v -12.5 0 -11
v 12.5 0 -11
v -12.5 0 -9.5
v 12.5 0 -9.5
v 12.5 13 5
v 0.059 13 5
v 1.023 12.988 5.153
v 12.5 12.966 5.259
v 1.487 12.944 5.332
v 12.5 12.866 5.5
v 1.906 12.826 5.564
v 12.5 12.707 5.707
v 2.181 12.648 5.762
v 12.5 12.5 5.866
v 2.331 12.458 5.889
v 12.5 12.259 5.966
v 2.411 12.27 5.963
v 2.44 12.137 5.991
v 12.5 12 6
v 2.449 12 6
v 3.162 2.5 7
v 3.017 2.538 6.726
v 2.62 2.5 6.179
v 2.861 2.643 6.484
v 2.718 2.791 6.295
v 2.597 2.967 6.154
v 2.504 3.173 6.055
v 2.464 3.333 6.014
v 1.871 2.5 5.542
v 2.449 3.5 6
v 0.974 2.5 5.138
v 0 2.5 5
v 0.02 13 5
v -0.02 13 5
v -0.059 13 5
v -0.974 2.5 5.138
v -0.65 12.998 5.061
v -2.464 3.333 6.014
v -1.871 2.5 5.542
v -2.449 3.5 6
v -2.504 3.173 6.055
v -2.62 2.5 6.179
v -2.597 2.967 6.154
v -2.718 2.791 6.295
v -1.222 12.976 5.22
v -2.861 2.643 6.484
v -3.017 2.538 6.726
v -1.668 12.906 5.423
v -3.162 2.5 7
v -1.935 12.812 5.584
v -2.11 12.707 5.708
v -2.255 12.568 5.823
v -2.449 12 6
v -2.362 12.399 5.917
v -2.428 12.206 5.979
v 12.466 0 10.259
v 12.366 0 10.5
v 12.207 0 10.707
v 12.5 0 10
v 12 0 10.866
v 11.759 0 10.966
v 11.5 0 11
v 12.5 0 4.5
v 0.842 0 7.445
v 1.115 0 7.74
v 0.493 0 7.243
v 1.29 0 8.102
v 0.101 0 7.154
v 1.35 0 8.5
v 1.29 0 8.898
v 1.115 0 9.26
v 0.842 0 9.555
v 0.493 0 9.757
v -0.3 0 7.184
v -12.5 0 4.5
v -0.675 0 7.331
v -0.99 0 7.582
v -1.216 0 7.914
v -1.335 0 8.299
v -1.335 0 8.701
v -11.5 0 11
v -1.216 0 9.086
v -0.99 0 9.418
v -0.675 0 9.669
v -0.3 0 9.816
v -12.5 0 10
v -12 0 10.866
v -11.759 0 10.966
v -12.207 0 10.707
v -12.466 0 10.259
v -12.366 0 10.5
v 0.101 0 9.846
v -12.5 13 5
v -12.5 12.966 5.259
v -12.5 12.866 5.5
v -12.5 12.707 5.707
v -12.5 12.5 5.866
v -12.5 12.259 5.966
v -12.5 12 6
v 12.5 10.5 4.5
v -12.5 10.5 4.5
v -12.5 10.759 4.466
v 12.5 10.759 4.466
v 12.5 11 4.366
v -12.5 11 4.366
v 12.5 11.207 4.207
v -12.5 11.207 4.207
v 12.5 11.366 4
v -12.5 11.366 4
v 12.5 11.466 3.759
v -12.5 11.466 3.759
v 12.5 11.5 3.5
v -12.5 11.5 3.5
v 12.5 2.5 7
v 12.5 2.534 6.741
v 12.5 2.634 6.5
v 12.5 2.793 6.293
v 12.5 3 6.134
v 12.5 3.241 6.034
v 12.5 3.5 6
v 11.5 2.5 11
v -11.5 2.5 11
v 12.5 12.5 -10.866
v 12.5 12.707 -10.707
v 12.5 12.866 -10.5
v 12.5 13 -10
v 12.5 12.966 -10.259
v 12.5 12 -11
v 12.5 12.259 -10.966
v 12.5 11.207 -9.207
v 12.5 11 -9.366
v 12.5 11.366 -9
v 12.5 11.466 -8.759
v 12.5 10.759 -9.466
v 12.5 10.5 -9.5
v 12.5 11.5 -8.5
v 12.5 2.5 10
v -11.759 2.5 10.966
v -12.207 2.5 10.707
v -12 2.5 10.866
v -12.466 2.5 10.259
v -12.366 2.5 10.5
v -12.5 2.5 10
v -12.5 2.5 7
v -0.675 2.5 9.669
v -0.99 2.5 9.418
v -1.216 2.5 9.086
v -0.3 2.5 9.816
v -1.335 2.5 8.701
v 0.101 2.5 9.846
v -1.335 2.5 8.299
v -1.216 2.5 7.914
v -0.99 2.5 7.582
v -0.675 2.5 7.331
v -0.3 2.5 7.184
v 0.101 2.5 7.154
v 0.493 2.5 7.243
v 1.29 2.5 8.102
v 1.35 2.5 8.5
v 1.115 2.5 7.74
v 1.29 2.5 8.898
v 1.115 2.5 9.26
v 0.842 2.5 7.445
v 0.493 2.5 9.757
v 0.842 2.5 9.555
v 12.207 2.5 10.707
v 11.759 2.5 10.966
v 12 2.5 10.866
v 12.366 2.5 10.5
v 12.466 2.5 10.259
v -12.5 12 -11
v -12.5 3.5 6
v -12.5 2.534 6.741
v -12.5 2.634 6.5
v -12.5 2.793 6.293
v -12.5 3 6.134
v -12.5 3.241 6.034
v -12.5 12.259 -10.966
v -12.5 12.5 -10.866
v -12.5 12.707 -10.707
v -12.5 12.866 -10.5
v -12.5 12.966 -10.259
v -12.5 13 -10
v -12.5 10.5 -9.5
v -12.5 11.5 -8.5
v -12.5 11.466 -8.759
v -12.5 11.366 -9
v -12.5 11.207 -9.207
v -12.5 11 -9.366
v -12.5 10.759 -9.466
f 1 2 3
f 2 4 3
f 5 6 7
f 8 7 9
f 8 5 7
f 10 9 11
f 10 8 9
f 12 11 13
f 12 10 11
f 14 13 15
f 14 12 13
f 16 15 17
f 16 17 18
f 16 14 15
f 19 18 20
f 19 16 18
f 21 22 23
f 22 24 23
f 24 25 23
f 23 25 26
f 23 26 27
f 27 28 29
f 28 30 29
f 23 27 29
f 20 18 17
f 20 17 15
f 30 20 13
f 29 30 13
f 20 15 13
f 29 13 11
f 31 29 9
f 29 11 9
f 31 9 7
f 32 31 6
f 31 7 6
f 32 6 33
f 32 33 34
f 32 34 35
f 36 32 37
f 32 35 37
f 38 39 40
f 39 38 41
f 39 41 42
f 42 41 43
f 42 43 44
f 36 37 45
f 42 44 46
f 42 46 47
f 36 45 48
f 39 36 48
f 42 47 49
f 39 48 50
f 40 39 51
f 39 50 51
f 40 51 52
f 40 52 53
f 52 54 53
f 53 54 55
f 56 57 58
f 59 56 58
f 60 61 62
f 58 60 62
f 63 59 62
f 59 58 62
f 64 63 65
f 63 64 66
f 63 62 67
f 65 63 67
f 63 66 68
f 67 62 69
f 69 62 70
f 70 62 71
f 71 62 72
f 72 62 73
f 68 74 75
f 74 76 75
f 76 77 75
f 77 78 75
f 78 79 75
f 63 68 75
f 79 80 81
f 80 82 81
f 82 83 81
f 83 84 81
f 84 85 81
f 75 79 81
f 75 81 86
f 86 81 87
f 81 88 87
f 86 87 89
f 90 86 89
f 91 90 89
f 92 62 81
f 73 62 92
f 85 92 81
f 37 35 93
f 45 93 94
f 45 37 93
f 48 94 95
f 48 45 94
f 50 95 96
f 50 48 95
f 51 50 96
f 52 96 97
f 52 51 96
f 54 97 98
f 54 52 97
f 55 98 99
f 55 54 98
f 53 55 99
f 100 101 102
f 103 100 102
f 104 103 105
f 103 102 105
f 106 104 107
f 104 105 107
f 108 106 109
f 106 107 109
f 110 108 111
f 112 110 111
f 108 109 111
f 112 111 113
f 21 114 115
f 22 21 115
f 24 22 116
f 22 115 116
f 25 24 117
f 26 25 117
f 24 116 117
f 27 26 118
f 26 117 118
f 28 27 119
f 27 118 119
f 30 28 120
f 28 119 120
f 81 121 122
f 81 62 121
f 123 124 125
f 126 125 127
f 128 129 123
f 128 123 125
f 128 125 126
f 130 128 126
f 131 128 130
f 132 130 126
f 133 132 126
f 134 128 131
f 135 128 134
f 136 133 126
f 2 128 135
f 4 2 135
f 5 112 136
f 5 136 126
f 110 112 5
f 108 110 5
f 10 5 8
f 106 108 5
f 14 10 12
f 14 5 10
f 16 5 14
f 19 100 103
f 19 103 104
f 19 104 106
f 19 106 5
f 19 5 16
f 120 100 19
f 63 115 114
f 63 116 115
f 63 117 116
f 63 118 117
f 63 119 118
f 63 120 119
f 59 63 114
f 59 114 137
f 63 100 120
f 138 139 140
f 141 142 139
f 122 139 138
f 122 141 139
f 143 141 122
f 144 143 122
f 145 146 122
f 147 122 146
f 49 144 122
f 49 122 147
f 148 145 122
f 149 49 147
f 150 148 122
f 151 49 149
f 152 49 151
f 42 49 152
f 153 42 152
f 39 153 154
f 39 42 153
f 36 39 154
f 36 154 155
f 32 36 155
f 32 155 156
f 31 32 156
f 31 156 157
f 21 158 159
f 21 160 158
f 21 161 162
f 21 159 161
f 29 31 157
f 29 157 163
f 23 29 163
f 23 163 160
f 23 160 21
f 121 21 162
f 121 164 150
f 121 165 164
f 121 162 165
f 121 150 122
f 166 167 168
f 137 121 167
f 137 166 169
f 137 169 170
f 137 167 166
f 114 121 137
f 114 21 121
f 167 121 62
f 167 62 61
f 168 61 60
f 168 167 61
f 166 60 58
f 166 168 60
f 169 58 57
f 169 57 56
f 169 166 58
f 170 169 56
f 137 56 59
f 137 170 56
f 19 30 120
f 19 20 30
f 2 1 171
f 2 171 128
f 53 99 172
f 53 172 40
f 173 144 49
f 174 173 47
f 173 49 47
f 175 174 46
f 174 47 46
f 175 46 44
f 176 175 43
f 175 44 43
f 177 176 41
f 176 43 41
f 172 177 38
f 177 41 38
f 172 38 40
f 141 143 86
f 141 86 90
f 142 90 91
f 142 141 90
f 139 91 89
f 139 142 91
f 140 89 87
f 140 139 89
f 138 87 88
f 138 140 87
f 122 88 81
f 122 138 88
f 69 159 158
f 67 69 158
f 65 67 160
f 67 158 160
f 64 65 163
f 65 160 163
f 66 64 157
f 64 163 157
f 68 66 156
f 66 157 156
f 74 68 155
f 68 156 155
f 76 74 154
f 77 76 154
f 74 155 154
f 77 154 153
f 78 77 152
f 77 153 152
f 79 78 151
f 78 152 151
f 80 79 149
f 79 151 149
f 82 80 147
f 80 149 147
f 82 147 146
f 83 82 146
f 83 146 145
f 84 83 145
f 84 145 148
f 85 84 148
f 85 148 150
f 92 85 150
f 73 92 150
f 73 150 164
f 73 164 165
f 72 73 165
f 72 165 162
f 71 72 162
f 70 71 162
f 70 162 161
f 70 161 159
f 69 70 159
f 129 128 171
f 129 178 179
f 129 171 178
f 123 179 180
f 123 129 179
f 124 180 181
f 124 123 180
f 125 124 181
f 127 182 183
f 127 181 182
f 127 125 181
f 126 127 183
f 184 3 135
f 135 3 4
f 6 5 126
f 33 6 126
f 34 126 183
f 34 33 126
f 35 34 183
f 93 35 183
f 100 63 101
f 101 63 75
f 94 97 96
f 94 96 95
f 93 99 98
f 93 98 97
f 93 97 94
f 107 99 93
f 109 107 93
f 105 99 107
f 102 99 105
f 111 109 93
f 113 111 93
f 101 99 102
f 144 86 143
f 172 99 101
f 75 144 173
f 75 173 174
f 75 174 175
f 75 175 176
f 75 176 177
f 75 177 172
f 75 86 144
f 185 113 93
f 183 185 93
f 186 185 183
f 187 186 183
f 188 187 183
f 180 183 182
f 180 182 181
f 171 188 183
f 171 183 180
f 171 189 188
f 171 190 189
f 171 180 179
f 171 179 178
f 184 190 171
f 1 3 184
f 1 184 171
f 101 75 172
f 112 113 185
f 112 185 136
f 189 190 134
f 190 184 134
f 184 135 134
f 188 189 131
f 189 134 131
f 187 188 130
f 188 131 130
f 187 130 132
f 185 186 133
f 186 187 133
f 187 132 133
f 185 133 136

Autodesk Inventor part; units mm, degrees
ref_plane "YZ Plane" through (0, 0, 0) normal (1, 0, 0) x (0, 1, 0)
ref_plane "XZ Plane" through (0, 0, 0) normal (0, 1, 0) x (-1, 0, 0)
ref_plane "XY Plane" through (0, 0, 0) normal (0, 0, 1) x (1, 0, 0)
sketch "Esquisse1" plane through (0, 0, 0) normal (0, 1, 0) x (-1, 0, 0)
  line L0 (-12.5, 11) -> (12.5, 11)
  line L1 (12.5, 11) -> (12.5, -11)
  line L2 (12.5, -11) -> (-12.5, -11)
  line L3 (-12.5, -11) -> (-12.5, 11)
  point P0 (0, 0)
  dimension "d0" = 25
  dimension "d1" = 22
  dimension "d2" = 11
  dimension "d3" = 12.5
extrude "Extrusion1" add sketch "Esquisse1" along normal blind 13
sketch "Esquisse2" plane through (0, 13, 0) normal (0, 1, 0) x (1, 0, 0)
  line L0 (-12.5, 11) -> (-12.5, -11) projected
  line L1 (-12.5, -6) -> (12.5, -6)
  line L2 (12.5, -6) -> (12.5, -11)
  line L3 (12.5, -11) -> (-12.5, -11)
  line L4 (-12.5, -11) -> (-12.5, -6)
  point P0 (0, 0)
  dimension "d6" = 5
extrude "Extrusion3" cut sketch "Esquisse2" against normal blind 10.5
fillet "Congé2" radius 1 1 edges at (0, 2.5, 6)
sketch "Esquisse4" plane through (0, 13, 0) normal (0, 1, 0) x (1, 0, 0)
  circle A0 centre (0, -8.5) radius 3.5
  line L0 (12.5, -11) -> (-12.5, -11) projected
  point P0 (12.5, -6)
  point P1 (0, 0)
  dimension "d11" = 7
  dimension "d12" = 2.5
  dimension "d13" = 5
extrude "Extrusion4" cut sketch "Esquisse4" against normal blind 10.5
sketch "Esquisse6" plane through (0, 0, 0) normal (0, -1, 0) x (1, 0, 0)
  line L0 (-12.5, 11) -> (-12.5, -11) projected
  line L1 (-12.5, -11) -> (12.5, -11) projected
  line L2 (12.5, -11) -> (12.5, 11) projected
  line L3 (-12.5, -9.5) -> (12.5, -9.5)
  line L4 (12.5, -9.5) -> (12.5, 4.5)
  line L5 (12.5, 4.5) -> (-12.5, 4.5)
  line L6 (-12.5, 4.5) -> (-12.5, -9.5)
  point P0 (0, 0)
  dimension "d17" = 0
  dimension "d18" = 0
  dimension "d19" = 1.5
  dimension "d20" = 6.5
extrude "Extrusion5" cut sketch "Esquisse6" against normal blind 11.5 contours L5 L2 L3 L0
fillet "Congé3" radius 1 2 edges at (-12.5, 1.25, 11) (12.5, 1.25, 11)
fillet "Congé4" radius 1 5 edges at (0, 11.5, -9.5) (0, 13, -11) (0, 11.5, 4.5) (-7.4747, 13, 6) (7.4747, 13, 6)
sketch "Esquisse7" plane through (0, 2.5, 0) normal (0, 1, 0) x (1, 0, 0)
  arc A0 (3.1623, -7) -> (-3.1623, -7) centre (0, -8.5) ccw projected
  circle A1 centre (0, -8.5) radius 1.35
  point P0 (0, 0)
  dimension "d27" = 2.7
extrude "Extrusion6" cut sketch "Esquisse7" against normal through all
equation "\"d2\" = 0.5 * d1"
equation "\"d3\" = 0.5 * d0"
equation "\"d12\" = 0.5 * d13"
properties part number "capot" material "Plastique ABS"
